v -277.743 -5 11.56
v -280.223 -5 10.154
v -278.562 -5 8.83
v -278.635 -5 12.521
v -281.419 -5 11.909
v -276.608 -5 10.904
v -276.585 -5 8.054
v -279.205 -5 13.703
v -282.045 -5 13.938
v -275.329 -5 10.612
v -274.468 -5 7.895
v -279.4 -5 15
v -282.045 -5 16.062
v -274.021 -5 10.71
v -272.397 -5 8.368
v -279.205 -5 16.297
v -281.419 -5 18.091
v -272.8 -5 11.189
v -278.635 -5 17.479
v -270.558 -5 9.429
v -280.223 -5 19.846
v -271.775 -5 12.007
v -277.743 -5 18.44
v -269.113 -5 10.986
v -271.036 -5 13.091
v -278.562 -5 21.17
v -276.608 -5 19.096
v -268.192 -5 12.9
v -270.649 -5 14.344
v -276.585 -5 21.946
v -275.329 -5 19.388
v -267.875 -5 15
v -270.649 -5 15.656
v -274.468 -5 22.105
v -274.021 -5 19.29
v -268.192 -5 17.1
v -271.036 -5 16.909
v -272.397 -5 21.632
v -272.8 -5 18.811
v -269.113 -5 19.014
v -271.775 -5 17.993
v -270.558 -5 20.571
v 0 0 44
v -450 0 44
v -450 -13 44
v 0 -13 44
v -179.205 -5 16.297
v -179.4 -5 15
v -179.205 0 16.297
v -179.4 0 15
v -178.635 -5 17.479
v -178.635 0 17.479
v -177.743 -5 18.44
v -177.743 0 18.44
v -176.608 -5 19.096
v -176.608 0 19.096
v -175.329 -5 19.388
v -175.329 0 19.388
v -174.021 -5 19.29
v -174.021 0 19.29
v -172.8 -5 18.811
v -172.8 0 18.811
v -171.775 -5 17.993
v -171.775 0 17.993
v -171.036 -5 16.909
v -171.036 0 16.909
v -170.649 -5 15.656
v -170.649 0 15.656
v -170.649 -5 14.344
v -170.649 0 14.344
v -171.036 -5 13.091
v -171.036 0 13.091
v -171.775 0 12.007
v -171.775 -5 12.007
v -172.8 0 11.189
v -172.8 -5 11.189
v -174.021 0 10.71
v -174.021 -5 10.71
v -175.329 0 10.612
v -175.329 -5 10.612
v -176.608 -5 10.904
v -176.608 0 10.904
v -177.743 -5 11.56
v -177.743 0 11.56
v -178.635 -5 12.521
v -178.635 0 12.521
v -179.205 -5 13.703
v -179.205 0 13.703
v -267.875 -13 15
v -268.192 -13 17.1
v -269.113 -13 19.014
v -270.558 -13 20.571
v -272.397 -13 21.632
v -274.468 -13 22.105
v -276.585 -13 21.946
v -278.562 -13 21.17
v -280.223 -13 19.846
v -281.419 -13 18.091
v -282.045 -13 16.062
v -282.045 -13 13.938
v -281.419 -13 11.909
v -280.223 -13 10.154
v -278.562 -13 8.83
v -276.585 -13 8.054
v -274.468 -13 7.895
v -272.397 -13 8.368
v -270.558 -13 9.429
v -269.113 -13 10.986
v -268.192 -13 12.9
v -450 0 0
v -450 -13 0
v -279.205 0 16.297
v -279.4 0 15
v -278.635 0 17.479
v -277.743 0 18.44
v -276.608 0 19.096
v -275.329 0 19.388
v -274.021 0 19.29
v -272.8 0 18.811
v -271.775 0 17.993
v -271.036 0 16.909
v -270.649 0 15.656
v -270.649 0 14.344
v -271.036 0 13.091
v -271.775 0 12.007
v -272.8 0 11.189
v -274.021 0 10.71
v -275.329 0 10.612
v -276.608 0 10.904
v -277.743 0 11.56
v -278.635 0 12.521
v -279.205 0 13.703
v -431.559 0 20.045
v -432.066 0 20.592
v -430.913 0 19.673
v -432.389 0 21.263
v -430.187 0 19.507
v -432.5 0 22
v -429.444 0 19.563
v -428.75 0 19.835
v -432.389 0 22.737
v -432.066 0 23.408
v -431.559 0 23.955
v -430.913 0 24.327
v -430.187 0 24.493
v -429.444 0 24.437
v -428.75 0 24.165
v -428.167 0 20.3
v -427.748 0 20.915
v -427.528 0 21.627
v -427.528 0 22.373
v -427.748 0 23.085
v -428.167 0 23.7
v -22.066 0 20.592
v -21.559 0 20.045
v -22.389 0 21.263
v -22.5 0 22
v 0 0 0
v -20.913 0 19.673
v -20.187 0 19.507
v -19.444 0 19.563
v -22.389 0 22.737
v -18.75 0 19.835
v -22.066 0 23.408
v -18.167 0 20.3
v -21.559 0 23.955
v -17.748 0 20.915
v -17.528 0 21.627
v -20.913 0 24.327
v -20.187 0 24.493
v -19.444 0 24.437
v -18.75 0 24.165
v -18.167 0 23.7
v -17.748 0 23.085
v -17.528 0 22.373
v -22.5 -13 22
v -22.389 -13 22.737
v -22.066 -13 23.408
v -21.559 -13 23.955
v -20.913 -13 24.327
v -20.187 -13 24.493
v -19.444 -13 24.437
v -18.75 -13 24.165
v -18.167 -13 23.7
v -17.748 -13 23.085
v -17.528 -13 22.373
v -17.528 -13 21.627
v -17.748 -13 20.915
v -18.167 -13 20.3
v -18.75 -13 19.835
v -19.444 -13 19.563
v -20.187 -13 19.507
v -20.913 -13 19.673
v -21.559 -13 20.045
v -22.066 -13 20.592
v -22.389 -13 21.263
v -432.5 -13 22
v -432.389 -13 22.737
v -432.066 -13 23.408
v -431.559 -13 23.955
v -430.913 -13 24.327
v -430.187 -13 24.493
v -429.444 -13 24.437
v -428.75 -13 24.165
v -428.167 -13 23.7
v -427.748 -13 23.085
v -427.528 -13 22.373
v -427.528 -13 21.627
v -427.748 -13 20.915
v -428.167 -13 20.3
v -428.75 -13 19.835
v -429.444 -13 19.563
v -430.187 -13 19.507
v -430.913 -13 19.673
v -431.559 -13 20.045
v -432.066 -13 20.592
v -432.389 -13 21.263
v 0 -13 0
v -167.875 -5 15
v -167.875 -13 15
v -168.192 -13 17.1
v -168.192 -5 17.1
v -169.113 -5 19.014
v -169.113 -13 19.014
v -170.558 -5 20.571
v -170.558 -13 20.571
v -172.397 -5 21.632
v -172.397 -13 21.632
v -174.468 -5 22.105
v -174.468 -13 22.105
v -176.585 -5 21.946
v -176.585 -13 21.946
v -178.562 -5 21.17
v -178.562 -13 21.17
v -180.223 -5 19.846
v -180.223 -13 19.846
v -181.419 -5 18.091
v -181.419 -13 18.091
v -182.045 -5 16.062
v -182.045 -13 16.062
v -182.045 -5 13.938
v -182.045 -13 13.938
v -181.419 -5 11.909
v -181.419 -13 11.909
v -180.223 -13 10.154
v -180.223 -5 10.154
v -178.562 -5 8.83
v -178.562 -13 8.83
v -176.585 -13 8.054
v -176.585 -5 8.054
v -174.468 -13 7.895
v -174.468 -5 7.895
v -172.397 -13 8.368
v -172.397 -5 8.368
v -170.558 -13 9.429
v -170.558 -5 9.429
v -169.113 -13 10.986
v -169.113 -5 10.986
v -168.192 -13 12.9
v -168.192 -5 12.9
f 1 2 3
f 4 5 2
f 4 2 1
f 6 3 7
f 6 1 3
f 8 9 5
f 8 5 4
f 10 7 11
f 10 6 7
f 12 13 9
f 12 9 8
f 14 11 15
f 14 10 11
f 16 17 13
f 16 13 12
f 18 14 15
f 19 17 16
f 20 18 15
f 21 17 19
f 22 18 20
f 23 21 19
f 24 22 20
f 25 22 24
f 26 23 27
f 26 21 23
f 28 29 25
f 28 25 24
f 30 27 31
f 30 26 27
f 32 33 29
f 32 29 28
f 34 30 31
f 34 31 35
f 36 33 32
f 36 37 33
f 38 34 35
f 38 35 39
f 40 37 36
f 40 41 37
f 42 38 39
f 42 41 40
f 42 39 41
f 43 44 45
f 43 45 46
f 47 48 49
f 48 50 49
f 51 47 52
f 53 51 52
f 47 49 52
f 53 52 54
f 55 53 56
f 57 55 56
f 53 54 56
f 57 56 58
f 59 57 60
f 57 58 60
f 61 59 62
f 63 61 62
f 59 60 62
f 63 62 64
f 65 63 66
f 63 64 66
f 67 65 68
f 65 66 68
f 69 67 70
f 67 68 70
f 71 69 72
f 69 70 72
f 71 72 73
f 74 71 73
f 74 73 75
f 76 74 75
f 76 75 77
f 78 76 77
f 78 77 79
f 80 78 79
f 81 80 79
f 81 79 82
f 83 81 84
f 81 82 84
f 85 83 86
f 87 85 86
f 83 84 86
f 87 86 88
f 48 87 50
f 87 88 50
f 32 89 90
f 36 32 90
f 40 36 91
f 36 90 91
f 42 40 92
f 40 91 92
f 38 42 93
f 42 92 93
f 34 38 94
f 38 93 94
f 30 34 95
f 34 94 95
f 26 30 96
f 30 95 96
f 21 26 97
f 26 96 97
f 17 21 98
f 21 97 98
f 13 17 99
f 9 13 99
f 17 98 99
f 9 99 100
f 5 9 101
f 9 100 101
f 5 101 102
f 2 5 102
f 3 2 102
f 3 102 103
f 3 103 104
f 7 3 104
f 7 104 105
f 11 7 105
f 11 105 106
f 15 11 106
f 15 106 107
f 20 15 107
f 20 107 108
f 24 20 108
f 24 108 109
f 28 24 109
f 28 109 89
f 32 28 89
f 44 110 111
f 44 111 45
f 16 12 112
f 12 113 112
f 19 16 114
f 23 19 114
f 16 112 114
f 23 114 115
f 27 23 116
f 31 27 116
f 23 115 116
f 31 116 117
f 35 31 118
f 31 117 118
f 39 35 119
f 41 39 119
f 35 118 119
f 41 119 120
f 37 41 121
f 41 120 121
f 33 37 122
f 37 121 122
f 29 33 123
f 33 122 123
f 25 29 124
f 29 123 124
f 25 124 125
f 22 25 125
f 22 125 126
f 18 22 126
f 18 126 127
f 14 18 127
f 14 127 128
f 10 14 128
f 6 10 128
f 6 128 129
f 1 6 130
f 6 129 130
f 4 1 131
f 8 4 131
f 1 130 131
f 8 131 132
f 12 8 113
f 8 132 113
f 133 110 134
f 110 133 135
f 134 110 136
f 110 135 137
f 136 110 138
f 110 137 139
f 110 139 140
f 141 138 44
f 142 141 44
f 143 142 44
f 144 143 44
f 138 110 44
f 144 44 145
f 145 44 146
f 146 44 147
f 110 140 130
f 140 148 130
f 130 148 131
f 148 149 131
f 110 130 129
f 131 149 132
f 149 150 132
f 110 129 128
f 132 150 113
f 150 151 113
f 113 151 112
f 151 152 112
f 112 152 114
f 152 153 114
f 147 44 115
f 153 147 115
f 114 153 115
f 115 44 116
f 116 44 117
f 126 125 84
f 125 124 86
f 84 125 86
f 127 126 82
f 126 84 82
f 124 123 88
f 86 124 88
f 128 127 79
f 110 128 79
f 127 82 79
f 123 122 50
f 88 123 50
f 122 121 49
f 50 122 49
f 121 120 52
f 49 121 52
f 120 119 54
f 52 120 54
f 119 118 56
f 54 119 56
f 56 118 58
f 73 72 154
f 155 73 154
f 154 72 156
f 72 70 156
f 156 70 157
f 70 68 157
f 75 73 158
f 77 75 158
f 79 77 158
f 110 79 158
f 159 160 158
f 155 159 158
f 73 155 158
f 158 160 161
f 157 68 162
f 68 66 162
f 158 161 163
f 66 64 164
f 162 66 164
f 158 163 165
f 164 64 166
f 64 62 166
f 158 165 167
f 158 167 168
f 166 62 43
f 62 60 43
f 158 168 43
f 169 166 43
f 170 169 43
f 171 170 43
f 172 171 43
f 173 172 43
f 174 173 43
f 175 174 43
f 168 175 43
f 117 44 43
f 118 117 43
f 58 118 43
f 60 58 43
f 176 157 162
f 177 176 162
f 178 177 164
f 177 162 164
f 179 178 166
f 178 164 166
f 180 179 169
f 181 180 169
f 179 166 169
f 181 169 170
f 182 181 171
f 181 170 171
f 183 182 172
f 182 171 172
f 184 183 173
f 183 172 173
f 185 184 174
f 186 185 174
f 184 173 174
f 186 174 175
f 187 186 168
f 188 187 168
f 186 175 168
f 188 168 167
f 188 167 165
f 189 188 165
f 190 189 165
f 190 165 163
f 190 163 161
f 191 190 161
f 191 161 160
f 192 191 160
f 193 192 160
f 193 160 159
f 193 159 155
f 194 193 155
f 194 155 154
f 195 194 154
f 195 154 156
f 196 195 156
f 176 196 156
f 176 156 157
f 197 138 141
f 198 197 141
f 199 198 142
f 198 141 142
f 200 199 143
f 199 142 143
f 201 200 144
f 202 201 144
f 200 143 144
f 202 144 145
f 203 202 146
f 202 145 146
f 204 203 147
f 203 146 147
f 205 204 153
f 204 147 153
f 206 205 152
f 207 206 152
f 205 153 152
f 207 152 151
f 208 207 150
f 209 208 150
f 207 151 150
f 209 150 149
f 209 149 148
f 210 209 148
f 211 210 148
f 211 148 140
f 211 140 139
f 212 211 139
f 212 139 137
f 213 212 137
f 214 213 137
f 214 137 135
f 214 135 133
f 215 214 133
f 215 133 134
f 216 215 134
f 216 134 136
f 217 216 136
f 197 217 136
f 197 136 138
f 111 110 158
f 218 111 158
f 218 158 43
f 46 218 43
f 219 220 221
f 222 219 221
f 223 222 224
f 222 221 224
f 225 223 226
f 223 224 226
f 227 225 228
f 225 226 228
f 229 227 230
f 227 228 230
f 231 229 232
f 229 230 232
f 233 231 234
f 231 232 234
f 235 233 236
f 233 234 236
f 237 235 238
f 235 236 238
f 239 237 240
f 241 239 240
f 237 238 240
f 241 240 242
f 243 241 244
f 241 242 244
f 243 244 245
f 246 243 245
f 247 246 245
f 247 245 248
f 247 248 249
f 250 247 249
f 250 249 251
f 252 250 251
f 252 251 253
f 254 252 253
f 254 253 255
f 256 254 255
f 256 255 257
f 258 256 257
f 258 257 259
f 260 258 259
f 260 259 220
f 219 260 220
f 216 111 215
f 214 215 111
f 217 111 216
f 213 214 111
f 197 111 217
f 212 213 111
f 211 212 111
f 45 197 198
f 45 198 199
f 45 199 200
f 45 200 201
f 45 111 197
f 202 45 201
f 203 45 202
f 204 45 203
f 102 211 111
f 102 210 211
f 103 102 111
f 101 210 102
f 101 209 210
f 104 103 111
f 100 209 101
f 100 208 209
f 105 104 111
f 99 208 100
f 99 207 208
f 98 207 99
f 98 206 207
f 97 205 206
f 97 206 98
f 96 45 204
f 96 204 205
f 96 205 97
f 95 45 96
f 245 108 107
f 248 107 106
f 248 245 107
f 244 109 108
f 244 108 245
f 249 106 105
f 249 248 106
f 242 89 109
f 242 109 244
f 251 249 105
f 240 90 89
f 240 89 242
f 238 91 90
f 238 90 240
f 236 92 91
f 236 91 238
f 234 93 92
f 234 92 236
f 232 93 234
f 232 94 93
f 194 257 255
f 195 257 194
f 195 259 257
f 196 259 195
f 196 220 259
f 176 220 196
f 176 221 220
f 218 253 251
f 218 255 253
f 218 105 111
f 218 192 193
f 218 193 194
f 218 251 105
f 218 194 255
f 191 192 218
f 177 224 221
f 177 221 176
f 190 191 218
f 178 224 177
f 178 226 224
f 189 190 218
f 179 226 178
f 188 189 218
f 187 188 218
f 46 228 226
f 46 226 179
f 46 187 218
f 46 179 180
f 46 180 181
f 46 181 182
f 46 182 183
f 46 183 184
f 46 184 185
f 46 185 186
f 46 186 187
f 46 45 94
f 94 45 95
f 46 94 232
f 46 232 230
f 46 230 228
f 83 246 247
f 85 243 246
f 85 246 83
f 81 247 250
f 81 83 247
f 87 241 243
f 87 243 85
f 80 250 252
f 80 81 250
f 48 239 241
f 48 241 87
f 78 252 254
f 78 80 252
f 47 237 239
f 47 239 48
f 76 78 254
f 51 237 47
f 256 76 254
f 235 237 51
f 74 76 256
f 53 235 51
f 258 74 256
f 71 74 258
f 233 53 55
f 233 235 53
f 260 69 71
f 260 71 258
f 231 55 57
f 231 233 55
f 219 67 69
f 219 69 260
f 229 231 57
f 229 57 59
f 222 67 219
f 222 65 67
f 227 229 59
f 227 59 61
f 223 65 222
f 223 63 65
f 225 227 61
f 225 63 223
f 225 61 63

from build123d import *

# Parameters (mm, degrees)
F0_W           = 450
F0_H           = 44
F1_DEPTH       = 13
F3_D           = 5
F4_D           = 8.8
F4_CBORE_D     = 14.25
F4_CBORE_DEPTH = 8


with BuildPart() as f1:
    # F0 (on Front) → F1 (new body)
    with BuildSketch(Plane.XZ):
        with Locations((-225, 22)):
            Rectangle(F0_W, F0_H)
    extrude(amount=F1_DEPTH)

    # F3 (through all)
    with Locations(Plane.XZ.offset(13)):
        with Locations((-430, 22), (-20, 22)):
            Hole(F3_D / 2)

    # F4 (through all)
    with Locations(Plane.XZ.offset(13)):
        with Locations((-275, 15), (-175, 15)):
            CounterBoreHole(F4_D / 2, F4_CBORE_D / 2, F4_CBORE_DEPTH)


solid = f1.part
